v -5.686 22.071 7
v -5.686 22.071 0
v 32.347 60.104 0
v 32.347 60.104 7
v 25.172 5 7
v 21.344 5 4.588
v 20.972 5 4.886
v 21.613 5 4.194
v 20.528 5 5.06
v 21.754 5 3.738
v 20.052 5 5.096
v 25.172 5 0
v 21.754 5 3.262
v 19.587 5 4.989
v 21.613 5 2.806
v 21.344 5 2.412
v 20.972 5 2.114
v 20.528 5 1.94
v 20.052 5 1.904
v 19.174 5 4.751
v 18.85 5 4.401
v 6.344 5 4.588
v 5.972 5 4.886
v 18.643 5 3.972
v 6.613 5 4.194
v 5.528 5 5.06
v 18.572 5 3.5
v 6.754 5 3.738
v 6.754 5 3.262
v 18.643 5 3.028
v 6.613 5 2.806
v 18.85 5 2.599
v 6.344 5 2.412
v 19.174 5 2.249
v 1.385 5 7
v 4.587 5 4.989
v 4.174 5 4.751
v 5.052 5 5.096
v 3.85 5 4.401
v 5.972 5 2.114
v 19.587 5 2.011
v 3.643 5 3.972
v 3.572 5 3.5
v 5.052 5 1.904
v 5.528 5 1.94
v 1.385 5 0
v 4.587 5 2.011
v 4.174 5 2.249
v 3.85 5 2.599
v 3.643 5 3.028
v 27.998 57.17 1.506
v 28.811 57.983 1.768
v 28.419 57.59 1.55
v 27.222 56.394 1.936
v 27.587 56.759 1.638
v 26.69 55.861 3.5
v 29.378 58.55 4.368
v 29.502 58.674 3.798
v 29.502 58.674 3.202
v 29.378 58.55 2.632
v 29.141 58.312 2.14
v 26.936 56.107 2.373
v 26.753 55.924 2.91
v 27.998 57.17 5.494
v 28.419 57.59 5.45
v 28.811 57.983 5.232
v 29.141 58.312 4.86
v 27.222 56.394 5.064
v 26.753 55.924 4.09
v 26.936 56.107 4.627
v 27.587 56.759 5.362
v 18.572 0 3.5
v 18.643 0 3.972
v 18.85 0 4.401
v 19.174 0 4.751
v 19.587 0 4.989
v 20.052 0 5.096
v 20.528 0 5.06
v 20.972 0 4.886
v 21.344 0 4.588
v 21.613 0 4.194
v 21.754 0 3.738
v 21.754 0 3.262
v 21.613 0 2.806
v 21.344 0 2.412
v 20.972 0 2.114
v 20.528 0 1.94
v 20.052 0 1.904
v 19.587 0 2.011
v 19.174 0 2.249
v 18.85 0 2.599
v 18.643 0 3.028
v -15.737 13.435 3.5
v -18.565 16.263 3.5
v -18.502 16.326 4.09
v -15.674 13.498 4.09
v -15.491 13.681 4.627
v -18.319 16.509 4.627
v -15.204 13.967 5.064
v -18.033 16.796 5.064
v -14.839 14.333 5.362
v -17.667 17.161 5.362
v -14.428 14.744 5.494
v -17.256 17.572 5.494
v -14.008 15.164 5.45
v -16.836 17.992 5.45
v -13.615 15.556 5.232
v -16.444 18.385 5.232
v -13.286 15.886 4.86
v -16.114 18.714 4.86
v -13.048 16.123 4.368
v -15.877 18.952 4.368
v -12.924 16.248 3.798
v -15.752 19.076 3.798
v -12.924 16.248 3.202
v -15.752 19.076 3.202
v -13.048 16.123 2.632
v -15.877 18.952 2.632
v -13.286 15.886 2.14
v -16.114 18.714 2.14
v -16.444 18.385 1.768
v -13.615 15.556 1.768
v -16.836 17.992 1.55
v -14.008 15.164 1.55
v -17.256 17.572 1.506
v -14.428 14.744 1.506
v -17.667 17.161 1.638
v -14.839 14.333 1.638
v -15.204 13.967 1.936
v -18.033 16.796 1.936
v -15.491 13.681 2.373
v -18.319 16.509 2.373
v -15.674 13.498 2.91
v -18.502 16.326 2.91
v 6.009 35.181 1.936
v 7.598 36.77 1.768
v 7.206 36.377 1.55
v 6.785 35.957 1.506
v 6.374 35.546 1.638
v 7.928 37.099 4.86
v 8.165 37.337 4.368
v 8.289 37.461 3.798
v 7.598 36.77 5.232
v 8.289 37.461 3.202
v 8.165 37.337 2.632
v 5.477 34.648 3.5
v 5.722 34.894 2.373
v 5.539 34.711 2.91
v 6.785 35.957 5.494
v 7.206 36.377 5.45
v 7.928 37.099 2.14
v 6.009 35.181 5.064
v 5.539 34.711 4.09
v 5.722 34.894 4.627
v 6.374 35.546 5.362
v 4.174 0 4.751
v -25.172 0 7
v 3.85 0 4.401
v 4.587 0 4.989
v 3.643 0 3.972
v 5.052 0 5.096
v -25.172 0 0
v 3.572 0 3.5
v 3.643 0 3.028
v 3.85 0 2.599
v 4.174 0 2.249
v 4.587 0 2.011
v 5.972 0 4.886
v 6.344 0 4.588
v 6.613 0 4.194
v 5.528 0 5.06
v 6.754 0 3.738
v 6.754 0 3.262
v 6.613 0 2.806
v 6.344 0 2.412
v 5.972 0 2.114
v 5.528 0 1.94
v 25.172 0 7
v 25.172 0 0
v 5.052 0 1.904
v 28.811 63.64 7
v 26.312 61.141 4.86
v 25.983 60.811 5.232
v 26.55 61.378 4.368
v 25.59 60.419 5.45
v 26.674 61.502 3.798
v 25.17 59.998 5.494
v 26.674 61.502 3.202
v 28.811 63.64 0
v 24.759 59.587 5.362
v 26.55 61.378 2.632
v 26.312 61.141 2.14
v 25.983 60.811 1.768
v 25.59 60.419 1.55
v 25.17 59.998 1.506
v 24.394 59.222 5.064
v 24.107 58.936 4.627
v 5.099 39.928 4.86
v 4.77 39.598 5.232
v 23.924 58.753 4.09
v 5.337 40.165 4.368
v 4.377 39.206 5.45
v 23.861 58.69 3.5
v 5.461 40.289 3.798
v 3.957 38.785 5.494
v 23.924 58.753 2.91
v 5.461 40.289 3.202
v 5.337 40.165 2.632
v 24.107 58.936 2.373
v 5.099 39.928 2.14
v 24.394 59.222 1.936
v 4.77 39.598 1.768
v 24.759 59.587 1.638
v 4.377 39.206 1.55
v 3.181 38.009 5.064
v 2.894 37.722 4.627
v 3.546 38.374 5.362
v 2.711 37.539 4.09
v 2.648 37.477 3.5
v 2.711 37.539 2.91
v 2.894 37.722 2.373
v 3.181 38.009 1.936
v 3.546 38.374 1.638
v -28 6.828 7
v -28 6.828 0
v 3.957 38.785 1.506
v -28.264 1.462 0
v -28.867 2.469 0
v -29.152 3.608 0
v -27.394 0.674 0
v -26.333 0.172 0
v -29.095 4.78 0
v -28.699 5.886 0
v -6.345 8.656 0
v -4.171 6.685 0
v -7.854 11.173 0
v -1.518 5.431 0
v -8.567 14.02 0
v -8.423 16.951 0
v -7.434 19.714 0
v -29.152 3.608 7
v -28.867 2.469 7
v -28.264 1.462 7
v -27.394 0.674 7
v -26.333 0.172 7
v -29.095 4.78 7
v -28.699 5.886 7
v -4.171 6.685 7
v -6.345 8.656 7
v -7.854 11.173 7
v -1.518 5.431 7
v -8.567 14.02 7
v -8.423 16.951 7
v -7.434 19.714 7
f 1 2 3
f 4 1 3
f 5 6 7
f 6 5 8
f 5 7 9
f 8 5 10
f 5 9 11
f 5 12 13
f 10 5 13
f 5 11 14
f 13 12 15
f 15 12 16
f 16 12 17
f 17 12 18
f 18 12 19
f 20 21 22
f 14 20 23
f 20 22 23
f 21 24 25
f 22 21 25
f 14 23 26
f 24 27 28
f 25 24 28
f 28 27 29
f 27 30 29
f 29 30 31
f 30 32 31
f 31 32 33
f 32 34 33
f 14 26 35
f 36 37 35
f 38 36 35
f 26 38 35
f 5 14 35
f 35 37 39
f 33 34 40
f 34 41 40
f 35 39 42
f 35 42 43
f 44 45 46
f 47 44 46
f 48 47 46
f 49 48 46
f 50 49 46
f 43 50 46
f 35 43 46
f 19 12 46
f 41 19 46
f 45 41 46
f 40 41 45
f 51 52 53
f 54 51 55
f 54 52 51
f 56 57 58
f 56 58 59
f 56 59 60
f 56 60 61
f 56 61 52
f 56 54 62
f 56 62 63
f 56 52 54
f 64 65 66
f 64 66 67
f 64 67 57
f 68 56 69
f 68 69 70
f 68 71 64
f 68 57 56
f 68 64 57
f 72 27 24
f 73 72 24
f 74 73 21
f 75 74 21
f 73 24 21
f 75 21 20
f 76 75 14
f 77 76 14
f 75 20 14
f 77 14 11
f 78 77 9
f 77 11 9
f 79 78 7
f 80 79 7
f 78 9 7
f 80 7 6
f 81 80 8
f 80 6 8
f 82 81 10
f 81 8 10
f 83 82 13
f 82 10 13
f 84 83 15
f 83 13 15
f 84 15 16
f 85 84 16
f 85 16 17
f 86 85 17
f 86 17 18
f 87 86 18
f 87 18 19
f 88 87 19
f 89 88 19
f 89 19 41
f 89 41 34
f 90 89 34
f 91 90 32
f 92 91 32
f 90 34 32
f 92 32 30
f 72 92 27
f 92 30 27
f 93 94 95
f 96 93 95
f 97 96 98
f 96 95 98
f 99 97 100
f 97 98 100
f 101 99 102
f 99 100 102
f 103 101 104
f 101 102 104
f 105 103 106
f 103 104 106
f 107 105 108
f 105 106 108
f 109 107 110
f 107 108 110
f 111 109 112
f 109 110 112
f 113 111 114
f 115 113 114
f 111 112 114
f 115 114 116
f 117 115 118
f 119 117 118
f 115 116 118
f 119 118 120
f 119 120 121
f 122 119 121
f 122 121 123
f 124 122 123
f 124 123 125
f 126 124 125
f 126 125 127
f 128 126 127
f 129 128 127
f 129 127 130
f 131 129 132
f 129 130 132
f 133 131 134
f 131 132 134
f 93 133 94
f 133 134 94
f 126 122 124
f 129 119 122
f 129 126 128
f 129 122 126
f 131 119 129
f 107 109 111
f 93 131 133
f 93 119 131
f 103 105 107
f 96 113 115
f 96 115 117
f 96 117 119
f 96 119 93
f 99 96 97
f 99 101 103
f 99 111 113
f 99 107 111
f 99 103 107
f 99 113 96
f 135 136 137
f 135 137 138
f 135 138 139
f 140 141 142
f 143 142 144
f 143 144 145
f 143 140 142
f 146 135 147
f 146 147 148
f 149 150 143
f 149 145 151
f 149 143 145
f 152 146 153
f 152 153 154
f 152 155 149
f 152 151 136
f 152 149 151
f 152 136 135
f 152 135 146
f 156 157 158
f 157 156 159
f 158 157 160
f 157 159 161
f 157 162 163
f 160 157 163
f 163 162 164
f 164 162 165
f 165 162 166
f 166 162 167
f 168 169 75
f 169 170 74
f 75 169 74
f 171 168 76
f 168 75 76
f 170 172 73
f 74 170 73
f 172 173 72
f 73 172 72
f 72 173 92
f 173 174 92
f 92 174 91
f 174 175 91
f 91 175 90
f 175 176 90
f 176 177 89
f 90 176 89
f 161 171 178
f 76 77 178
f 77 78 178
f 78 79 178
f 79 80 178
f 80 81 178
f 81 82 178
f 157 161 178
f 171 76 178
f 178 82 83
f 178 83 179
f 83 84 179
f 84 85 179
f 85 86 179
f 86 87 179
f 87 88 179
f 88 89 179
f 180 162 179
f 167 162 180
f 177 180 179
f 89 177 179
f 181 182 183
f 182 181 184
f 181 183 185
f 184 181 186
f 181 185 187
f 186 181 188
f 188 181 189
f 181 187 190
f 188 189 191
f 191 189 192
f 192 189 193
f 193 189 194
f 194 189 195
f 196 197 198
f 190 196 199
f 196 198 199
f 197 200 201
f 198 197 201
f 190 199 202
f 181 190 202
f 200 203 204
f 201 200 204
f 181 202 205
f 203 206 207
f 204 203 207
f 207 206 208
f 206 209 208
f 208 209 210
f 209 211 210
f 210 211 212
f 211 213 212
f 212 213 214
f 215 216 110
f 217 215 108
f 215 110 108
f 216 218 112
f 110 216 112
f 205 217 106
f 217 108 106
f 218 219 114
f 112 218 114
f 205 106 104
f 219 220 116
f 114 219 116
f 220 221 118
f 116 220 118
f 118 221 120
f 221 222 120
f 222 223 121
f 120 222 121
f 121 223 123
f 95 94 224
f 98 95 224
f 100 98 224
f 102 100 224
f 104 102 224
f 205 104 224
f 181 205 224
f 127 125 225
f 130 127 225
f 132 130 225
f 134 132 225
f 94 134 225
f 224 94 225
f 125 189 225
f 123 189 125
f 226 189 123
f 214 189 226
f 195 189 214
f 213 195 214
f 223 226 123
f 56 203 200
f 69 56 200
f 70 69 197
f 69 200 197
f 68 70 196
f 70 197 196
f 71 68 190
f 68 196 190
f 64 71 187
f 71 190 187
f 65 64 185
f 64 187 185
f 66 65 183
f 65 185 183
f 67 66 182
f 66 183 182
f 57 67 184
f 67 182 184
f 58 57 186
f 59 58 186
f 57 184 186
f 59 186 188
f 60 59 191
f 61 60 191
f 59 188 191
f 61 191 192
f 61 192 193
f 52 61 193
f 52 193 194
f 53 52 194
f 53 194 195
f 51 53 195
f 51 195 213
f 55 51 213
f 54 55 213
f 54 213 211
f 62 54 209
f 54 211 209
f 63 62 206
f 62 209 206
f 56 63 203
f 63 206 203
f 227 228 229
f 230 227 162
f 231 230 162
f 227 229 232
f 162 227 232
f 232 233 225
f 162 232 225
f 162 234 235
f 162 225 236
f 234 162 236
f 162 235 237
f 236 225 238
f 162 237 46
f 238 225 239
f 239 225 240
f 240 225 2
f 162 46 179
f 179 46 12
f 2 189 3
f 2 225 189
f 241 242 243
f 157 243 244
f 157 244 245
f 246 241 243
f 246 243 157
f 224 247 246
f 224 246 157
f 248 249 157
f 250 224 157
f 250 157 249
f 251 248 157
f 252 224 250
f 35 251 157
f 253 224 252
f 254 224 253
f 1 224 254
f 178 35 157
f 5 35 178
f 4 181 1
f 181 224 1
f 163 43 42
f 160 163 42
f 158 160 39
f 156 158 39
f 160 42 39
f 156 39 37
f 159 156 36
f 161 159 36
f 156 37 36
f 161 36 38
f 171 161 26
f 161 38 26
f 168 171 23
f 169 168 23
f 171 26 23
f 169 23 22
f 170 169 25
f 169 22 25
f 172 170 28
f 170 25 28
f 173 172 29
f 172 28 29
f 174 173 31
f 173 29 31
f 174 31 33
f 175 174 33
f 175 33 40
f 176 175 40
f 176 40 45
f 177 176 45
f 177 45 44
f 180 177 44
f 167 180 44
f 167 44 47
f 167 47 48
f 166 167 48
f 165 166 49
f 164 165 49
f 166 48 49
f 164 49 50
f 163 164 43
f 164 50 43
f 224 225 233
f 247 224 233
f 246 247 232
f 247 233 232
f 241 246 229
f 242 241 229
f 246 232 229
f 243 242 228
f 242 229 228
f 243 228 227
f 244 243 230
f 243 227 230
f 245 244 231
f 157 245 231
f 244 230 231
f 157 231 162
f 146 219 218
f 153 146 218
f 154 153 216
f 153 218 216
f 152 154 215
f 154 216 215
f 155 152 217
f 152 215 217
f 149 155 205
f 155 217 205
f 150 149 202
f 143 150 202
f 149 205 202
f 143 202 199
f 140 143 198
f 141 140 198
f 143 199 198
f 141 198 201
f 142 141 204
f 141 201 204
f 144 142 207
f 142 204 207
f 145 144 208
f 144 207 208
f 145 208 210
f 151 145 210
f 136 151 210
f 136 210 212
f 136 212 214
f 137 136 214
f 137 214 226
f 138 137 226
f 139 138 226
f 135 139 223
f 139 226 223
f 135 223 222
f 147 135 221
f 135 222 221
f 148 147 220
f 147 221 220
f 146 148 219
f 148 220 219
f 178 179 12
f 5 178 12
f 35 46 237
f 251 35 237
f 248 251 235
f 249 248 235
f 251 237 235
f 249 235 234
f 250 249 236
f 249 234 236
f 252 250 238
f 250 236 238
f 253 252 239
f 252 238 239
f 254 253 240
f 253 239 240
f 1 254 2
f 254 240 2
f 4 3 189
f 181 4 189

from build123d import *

# Parameters (mm, degrees)
F1_DEPTH = 7
F2_R     = 2
F3_DEPTH = 4
F4_R     = 1.6
F5_DEPTH = 5


with BuildPart() as f1:
    # F0 (on Top) → F1 (new body)
    with BuildSketch(Plane.XY):
        with BuildLine():
            Line((32.346717088, 60.1040764009), (28.811183182, 63.6396103068))
            Line((28.811183182, 63.6396103068), (-28, 6.8284271247))
            ThreePointArc((-28, 6.8284271247), (-28.8670910053, 2.4692662705), (-25.1715728753, 0))
            Line((-25.1715728753, 0), (25.1715728753, 0))
            Line((25.1715728753, 0), (25.1715728753, 5))
            Line((25.1715728753, 5), (1.3847763109, 5))
            ThreePointArc((1.3847763109, 5), (-7.8540190143, 11.1731656763), (-5.686291501, 22.0710678119))
            Line((-5.686291501, 22.0710678119), (32.346717088, 60.1040764009))
        make_face()
    extrude(amount=F1_DEPTH)

    # F2 (on face) → F3 (cut, through all)
    with BuildSketch(Plane(origin=(-17.4142135624, 17.4142135624, 0), x_dir=(-0.7071067812, -0.7071067812, 0), z_dir=(-0.7071067812, 0.7071067812, 0))):
        with Locations((-0.372583002, 3.5)):
            Circle(F2_R)
        with Locations((-60.372583002, 3.5)):
            Circle(F2_R)
        with Locations((-30.372583002, 3.5)):
            Circle(F2_R)
    extrude(amount=-F3_DEPTH, mode=Mode.SUBTRACT)

    # F4 (on face) → F5 (cut, through all)
    with BuildSketch(Plane(origin=(0, 5, 0), x_dir=(-1, 0, 0), z_dir=(0, 1, 0))):
        with Locations((-20.1715728753, 3.5)):
            Circle(F4_R)
        with Locations((-5.1715728753, 3.5)):
            Circle(F4_R)
    extrude(amount=-F5_DEPTH, mode=Mode.SUBTRACT)


solid = f1.part
